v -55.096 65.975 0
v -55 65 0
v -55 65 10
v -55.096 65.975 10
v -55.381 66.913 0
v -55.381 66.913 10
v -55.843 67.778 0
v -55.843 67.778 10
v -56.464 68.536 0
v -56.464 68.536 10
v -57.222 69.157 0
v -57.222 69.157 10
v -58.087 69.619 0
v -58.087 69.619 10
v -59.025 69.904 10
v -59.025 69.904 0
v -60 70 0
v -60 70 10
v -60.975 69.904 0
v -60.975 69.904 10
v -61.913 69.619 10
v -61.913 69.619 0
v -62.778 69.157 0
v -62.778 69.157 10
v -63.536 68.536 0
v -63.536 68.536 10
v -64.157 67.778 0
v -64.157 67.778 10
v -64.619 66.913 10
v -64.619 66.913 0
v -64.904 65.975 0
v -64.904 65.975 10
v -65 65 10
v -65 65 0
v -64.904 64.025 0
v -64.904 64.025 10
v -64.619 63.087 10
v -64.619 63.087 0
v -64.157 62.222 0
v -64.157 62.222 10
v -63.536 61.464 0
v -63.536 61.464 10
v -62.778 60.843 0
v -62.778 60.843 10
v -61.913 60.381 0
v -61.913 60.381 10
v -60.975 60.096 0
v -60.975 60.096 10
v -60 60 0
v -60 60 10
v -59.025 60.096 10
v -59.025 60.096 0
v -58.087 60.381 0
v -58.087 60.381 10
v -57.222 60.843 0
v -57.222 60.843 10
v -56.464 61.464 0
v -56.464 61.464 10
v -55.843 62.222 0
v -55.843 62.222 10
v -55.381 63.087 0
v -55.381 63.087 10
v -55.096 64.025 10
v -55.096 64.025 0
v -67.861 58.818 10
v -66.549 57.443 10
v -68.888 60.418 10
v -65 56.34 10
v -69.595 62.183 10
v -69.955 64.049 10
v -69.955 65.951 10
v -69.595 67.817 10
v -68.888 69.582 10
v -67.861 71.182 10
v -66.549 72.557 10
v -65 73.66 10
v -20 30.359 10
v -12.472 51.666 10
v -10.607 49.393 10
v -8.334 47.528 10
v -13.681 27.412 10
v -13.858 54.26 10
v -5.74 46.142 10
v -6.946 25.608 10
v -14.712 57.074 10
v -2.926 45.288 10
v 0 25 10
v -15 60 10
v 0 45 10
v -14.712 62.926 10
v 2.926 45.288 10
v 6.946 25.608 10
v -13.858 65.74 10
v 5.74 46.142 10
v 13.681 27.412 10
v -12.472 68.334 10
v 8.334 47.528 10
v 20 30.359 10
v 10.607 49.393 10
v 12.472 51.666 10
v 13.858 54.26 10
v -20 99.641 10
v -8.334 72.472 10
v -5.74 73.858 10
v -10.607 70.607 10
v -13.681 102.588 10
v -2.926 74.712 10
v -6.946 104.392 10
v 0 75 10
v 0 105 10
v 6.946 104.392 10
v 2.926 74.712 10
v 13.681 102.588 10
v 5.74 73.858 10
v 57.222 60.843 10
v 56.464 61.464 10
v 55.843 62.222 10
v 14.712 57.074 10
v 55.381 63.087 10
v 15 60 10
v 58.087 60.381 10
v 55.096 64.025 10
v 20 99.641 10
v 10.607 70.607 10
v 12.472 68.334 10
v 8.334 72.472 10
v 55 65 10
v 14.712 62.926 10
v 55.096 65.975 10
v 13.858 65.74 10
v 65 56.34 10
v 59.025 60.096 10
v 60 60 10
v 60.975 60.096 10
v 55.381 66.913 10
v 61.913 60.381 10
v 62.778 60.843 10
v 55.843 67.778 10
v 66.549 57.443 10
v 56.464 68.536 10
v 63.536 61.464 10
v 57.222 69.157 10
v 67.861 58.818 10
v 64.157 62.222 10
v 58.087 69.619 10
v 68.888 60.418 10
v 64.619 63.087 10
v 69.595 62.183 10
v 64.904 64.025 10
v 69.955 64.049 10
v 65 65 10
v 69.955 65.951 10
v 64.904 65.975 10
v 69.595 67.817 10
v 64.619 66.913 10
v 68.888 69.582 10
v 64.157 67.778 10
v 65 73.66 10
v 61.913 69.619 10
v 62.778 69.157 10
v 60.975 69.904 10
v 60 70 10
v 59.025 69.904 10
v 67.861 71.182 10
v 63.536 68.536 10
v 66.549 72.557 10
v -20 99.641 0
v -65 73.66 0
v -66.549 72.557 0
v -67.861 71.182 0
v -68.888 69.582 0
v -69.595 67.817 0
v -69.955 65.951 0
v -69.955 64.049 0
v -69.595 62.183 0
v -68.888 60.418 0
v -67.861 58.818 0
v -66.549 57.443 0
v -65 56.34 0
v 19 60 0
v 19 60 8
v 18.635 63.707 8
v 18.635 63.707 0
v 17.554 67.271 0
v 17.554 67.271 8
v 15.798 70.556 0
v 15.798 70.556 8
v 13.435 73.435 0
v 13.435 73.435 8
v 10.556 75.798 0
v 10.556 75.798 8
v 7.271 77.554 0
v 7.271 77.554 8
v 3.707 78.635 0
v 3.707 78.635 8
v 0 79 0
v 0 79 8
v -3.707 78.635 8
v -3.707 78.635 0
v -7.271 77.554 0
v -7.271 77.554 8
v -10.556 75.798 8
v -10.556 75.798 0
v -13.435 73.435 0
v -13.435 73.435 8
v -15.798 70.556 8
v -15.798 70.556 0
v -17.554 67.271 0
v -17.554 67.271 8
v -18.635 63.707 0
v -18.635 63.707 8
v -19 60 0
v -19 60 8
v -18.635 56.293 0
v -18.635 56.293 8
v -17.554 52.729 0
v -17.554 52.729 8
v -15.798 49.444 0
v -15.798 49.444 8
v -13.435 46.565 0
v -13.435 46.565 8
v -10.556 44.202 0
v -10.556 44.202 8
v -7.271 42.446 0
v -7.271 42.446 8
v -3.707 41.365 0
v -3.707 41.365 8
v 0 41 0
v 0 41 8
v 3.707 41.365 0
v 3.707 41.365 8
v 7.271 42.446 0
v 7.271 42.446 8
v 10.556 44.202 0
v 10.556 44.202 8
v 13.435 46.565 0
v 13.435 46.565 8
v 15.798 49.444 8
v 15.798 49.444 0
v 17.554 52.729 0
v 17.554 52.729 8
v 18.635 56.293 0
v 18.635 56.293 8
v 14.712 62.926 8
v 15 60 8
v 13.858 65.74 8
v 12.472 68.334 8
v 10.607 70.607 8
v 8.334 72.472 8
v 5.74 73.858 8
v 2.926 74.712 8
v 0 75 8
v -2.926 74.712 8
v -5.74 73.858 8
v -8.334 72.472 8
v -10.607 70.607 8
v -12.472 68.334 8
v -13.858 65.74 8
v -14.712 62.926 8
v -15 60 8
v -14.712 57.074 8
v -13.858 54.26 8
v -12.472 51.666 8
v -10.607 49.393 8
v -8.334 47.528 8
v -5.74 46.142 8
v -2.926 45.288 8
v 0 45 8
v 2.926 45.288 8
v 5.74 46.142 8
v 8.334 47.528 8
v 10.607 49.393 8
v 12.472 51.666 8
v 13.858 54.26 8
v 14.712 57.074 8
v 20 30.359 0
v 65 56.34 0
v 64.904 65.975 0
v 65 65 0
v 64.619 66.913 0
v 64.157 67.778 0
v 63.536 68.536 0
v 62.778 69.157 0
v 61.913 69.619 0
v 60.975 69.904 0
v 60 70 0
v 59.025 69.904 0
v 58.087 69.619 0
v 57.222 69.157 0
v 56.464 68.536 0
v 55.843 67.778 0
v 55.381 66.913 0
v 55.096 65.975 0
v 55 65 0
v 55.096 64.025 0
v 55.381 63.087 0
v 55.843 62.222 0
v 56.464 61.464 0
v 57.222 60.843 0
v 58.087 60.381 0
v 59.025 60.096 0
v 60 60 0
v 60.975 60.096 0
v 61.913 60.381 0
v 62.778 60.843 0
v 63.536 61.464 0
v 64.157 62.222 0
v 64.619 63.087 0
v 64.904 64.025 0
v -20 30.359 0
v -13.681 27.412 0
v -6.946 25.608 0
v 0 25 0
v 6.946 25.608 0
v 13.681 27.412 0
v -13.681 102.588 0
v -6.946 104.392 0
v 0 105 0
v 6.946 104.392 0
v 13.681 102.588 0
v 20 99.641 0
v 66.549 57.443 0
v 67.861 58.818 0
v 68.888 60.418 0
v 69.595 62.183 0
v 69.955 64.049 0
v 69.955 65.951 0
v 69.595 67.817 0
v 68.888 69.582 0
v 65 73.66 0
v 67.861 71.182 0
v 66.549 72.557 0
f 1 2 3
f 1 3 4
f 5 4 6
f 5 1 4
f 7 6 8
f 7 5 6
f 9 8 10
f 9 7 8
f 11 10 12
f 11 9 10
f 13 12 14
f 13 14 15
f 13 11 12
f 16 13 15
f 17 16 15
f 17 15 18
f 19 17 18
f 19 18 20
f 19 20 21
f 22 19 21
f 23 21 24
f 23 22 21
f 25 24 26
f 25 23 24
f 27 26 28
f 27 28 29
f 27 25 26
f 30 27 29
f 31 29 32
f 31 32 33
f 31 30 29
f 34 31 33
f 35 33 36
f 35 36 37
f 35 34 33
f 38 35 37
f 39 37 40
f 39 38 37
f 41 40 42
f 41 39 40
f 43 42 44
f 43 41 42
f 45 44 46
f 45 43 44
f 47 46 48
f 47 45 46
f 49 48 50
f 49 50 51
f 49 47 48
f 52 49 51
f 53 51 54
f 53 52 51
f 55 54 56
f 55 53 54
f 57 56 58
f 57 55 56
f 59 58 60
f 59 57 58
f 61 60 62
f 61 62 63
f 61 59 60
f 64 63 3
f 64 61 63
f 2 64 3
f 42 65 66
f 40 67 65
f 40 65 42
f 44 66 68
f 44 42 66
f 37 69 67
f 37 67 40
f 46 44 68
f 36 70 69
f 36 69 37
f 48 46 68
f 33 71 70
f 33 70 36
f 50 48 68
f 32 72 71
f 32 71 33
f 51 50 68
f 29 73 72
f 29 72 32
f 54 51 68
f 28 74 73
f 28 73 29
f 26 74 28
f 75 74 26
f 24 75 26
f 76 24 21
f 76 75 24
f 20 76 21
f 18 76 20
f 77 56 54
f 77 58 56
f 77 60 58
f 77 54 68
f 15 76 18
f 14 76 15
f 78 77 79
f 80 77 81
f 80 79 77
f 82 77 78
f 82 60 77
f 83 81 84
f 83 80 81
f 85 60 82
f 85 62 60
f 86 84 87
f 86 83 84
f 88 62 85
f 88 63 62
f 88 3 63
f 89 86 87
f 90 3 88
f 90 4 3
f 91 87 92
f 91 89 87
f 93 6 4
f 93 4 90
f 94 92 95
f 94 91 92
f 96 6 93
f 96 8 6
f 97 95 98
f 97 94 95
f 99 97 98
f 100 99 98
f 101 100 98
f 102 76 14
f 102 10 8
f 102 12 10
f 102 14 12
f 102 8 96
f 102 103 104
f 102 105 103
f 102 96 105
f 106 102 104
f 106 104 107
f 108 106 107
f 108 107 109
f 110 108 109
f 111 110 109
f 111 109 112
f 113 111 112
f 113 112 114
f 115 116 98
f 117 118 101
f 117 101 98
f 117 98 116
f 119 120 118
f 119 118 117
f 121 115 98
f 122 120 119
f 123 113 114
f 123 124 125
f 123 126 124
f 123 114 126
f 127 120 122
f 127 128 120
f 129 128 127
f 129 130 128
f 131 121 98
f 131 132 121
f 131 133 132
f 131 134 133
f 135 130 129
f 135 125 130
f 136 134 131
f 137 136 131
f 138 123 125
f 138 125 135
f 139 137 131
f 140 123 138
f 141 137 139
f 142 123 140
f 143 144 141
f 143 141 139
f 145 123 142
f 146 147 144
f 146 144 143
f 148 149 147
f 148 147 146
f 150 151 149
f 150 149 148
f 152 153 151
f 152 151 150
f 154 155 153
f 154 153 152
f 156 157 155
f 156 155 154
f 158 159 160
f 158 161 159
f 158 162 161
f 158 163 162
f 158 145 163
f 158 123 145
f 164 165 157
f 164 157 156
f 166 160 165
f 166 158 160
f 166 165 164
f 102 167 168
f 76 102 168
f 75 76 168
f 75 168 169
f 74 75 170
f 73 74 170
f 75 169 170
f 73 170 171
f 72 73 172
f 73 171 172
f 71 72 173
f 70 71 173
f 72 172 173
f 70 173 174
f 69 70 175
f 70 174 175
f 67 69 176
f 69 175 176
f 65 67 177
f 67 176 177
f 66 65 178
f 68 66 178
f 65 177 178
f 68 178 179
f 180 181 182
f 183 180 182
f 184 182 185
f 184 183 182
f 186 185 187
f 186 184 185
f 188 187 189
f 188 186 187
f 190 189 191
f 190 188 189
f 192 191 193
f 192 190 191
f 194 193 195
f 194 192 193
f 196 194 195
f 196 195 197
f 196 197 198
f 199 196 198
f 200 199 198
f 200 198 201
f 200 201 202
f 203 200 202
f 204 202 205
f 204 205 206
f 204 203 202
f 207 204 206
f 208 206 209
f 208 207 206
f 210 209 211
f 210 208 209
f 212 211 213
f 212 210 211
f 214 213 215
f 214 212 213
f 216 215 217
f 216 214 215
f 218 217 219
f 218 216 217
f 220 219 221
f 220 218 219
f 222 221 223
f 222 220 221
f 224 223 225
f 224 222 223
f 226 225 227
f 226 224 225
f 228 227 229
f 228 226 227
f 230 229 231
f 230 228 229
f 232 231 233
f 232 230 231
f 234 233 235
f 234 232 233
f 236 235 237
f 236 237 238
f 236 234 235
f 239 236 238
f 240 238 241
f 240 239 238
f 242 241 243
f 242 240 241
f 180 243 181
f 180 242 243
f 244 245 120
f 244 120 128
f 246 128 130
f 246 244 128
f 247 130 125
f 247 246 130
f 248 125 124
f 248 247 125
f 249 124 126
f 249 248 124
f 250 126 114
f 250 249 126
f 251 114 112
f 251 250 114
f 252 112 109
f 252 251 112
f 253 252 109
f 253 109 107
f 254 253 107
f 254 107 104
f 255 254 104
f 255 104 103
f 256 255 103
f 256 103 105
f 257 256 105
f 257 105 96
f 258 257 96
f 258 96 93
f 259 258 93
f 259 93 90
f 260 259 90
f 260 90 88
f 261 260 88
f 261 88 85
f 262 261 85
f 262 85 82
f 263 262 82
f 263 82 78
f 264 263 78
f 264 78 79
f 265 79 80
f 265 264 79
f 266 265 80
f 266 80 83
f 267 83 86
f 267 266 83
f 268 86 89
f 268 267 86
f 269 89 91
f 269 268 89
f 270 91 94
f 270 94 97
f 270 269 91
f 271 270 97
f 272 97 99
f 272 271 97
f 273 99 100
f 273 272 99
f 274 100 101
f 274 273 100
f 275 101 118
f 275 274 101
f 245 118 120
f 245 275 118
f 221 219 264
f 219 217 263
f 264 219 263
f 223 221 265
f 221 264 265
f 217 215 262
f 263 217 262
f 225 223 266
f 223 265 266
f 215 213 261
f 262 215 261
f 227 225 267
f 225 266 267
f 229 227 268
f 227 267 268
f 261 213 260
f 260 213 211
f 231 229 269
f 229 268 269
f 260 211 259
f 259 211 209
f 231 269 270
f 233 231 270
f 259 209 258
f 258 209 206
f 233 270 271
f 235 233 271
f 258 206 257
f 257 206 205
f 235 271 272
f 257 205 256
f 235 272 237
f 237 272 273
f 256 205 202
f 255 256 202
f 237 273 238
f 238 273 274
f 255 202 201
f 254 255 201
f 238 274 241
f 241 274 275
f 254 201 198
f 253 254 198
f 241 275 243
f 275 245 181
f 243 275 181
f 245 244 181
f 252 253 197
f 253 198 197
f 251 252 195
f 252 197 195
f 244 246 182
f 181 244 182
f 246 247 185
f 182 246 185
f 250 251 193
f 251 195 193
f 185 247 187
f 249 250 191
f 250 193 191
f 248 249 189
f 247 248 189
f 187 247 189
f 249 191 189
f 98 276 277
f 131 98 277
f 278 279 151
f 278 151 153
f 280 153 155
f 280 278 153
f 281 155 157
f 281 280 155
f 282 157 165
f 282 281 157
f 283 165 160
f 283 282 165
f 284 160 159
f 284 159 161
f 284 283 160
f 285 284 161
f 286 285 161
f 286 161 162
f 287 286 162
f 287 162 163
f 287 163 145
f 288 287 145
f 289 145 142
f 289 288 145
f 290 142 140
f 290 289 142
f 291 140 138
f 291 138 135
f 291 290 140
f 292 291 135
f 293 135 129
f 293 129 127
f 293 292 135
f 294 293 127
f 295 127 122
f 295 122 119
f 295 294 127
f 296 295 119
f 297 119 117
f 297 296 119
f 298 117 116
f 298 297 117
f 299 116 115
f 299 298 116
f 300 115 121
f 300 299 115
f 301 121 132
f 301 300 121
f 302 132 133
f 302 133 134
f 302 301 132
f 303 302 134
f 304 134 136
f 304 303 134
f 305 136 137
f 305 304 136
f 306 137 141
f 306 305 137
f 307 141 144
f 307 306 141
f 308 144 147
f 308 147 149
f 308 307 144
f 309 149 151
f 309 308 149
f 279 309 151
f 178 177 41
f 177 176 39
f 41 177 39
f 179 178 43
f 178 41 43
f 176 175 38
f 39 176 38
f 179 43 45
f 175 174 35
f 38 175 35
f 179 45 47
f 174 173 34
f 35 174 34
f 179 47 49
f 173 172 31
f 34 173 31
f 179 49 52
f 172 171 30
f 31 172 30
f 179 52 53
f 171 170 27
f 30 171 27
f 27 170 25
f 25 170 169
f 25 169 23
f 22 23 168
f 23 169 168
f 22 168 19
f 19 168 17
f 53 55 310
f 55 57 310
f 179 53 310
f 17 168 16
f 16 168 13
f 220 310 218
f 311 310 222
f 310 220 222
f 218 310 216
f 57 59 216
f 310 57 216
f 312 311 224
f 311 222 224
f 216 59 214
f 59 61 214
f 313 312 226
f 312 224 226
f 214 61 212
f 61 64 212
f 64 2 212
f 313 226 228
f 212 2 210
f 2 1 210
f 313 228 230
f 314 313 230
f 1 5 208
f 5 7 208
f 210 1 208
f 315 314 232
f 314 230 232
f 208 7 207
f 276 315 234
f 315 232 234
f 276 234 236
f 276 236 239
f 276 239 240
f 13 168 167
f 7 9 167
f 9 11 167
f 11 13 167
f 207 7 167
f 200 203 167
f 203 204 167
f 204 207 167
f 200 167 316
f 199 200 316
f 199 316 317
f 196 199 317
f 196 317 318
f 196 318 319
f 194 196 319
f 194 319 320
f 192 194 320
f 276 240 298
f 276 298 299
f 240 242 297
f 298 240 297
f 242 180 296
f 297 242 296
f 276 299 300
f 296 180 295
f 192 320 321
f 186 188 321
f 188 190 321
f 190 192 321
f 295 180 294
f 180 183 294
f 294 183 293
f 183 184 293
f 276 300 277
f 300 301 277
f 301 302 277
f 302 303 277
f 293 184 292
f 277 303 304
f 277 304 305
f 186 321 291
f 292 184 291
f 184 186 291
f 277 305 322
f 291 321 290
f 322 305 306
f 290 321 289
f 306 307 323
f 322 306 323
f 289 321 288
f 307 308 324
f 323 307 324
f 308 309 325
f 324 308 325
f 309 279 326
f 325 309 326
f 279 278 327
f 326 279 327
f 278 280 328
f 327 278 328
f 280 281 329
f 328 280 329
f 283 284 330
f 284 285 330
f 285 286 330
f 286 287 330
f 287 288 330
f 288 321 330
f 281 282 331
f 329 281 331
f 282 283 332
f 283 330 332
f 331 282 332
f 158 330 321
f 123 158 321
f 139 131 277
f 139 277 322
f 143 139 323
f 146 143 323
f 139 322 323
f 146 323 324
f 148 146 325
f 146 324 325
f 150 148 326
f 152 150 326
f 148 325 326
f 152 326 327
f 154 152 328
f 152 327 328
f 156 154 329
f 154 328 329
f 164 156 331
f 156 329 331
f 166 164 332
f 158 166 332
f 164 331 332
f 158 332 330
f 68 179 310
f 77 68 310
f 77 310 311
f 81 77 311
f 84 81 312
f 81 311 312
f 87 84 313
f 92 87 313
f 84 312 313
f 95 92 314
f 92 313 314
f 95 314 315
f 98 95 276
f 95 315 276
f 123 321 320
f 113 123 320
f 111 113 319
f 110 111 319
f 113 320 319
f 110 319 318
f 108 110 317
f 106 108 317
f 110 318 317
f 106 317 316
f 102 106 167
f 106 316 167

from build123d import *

# Parameters (mm, degrees)
BOSS_EXTRUDE1_DEPTH = 10
SKETCH1_3_R         = 15
SKETCH1_3_R_2       = 5
CUT_EXTRUDE1_DEPTH  = 10
SKETCH1_4_R         = 19
CUT_EXTRUDE2_DEPTH  = 8


with BuildPart() as part:
    # Sketch1 → Boss-Extrude1 (new body)
    with BuildSketch(Plane.XY):
        with BuildLine():
            Line((-20, 99.641016151), (-65, 73.660254038))
            ThreePointArc((-65, 73.660254038), (-70, 65), (-65, 56.339745962))
            Line((-65, 56.339745962), (-20, 30.358983849))
            ThreePointArc((-20, 30.358983849), (0, 25), (20, 30.358983849))
            Line((20, 30.358983849), (65, 56.339745962))
            ThreePointArc((65, 56.339745962), (70, 65), (65, 73.660254038))
            Line((65, 73.660254038), (20, 99.641016151))
            ThreePointArc((20, 99.641016151), (0, 105), (-20, 99.641016151))
        make_face()
    extrude(amount=BOSS_EXTRUDE1_DEPTH)

    # Sketch1<3> → Cut-Extrude1 (cut)
    with BuildSketch(Plane.XY):
        with Locations((0, 60)):
            Circle(SKETCH1_3_R)
        with Locations((-60, 65)):
            Circle(SKETCH1_3_R_2)
        with Locations((60, 65)):
            Circle(SKETCH1_3_R_2)
    extrude(amount=CUT_EXTRUDE1_DEPTH, mode=Mode.SUBTRACT)

    # Sketch1<4> → Cut-Extrude2 (cut)
    with BuildSketch(Plane.XY):
        with Locations((0, 60)):
            Circle(SKETCH1_4_R)
    extrude(amount=CUT_EXTRUDE2_DEPTH, mode=Mode.SUBTRACT)


solid = part.part
